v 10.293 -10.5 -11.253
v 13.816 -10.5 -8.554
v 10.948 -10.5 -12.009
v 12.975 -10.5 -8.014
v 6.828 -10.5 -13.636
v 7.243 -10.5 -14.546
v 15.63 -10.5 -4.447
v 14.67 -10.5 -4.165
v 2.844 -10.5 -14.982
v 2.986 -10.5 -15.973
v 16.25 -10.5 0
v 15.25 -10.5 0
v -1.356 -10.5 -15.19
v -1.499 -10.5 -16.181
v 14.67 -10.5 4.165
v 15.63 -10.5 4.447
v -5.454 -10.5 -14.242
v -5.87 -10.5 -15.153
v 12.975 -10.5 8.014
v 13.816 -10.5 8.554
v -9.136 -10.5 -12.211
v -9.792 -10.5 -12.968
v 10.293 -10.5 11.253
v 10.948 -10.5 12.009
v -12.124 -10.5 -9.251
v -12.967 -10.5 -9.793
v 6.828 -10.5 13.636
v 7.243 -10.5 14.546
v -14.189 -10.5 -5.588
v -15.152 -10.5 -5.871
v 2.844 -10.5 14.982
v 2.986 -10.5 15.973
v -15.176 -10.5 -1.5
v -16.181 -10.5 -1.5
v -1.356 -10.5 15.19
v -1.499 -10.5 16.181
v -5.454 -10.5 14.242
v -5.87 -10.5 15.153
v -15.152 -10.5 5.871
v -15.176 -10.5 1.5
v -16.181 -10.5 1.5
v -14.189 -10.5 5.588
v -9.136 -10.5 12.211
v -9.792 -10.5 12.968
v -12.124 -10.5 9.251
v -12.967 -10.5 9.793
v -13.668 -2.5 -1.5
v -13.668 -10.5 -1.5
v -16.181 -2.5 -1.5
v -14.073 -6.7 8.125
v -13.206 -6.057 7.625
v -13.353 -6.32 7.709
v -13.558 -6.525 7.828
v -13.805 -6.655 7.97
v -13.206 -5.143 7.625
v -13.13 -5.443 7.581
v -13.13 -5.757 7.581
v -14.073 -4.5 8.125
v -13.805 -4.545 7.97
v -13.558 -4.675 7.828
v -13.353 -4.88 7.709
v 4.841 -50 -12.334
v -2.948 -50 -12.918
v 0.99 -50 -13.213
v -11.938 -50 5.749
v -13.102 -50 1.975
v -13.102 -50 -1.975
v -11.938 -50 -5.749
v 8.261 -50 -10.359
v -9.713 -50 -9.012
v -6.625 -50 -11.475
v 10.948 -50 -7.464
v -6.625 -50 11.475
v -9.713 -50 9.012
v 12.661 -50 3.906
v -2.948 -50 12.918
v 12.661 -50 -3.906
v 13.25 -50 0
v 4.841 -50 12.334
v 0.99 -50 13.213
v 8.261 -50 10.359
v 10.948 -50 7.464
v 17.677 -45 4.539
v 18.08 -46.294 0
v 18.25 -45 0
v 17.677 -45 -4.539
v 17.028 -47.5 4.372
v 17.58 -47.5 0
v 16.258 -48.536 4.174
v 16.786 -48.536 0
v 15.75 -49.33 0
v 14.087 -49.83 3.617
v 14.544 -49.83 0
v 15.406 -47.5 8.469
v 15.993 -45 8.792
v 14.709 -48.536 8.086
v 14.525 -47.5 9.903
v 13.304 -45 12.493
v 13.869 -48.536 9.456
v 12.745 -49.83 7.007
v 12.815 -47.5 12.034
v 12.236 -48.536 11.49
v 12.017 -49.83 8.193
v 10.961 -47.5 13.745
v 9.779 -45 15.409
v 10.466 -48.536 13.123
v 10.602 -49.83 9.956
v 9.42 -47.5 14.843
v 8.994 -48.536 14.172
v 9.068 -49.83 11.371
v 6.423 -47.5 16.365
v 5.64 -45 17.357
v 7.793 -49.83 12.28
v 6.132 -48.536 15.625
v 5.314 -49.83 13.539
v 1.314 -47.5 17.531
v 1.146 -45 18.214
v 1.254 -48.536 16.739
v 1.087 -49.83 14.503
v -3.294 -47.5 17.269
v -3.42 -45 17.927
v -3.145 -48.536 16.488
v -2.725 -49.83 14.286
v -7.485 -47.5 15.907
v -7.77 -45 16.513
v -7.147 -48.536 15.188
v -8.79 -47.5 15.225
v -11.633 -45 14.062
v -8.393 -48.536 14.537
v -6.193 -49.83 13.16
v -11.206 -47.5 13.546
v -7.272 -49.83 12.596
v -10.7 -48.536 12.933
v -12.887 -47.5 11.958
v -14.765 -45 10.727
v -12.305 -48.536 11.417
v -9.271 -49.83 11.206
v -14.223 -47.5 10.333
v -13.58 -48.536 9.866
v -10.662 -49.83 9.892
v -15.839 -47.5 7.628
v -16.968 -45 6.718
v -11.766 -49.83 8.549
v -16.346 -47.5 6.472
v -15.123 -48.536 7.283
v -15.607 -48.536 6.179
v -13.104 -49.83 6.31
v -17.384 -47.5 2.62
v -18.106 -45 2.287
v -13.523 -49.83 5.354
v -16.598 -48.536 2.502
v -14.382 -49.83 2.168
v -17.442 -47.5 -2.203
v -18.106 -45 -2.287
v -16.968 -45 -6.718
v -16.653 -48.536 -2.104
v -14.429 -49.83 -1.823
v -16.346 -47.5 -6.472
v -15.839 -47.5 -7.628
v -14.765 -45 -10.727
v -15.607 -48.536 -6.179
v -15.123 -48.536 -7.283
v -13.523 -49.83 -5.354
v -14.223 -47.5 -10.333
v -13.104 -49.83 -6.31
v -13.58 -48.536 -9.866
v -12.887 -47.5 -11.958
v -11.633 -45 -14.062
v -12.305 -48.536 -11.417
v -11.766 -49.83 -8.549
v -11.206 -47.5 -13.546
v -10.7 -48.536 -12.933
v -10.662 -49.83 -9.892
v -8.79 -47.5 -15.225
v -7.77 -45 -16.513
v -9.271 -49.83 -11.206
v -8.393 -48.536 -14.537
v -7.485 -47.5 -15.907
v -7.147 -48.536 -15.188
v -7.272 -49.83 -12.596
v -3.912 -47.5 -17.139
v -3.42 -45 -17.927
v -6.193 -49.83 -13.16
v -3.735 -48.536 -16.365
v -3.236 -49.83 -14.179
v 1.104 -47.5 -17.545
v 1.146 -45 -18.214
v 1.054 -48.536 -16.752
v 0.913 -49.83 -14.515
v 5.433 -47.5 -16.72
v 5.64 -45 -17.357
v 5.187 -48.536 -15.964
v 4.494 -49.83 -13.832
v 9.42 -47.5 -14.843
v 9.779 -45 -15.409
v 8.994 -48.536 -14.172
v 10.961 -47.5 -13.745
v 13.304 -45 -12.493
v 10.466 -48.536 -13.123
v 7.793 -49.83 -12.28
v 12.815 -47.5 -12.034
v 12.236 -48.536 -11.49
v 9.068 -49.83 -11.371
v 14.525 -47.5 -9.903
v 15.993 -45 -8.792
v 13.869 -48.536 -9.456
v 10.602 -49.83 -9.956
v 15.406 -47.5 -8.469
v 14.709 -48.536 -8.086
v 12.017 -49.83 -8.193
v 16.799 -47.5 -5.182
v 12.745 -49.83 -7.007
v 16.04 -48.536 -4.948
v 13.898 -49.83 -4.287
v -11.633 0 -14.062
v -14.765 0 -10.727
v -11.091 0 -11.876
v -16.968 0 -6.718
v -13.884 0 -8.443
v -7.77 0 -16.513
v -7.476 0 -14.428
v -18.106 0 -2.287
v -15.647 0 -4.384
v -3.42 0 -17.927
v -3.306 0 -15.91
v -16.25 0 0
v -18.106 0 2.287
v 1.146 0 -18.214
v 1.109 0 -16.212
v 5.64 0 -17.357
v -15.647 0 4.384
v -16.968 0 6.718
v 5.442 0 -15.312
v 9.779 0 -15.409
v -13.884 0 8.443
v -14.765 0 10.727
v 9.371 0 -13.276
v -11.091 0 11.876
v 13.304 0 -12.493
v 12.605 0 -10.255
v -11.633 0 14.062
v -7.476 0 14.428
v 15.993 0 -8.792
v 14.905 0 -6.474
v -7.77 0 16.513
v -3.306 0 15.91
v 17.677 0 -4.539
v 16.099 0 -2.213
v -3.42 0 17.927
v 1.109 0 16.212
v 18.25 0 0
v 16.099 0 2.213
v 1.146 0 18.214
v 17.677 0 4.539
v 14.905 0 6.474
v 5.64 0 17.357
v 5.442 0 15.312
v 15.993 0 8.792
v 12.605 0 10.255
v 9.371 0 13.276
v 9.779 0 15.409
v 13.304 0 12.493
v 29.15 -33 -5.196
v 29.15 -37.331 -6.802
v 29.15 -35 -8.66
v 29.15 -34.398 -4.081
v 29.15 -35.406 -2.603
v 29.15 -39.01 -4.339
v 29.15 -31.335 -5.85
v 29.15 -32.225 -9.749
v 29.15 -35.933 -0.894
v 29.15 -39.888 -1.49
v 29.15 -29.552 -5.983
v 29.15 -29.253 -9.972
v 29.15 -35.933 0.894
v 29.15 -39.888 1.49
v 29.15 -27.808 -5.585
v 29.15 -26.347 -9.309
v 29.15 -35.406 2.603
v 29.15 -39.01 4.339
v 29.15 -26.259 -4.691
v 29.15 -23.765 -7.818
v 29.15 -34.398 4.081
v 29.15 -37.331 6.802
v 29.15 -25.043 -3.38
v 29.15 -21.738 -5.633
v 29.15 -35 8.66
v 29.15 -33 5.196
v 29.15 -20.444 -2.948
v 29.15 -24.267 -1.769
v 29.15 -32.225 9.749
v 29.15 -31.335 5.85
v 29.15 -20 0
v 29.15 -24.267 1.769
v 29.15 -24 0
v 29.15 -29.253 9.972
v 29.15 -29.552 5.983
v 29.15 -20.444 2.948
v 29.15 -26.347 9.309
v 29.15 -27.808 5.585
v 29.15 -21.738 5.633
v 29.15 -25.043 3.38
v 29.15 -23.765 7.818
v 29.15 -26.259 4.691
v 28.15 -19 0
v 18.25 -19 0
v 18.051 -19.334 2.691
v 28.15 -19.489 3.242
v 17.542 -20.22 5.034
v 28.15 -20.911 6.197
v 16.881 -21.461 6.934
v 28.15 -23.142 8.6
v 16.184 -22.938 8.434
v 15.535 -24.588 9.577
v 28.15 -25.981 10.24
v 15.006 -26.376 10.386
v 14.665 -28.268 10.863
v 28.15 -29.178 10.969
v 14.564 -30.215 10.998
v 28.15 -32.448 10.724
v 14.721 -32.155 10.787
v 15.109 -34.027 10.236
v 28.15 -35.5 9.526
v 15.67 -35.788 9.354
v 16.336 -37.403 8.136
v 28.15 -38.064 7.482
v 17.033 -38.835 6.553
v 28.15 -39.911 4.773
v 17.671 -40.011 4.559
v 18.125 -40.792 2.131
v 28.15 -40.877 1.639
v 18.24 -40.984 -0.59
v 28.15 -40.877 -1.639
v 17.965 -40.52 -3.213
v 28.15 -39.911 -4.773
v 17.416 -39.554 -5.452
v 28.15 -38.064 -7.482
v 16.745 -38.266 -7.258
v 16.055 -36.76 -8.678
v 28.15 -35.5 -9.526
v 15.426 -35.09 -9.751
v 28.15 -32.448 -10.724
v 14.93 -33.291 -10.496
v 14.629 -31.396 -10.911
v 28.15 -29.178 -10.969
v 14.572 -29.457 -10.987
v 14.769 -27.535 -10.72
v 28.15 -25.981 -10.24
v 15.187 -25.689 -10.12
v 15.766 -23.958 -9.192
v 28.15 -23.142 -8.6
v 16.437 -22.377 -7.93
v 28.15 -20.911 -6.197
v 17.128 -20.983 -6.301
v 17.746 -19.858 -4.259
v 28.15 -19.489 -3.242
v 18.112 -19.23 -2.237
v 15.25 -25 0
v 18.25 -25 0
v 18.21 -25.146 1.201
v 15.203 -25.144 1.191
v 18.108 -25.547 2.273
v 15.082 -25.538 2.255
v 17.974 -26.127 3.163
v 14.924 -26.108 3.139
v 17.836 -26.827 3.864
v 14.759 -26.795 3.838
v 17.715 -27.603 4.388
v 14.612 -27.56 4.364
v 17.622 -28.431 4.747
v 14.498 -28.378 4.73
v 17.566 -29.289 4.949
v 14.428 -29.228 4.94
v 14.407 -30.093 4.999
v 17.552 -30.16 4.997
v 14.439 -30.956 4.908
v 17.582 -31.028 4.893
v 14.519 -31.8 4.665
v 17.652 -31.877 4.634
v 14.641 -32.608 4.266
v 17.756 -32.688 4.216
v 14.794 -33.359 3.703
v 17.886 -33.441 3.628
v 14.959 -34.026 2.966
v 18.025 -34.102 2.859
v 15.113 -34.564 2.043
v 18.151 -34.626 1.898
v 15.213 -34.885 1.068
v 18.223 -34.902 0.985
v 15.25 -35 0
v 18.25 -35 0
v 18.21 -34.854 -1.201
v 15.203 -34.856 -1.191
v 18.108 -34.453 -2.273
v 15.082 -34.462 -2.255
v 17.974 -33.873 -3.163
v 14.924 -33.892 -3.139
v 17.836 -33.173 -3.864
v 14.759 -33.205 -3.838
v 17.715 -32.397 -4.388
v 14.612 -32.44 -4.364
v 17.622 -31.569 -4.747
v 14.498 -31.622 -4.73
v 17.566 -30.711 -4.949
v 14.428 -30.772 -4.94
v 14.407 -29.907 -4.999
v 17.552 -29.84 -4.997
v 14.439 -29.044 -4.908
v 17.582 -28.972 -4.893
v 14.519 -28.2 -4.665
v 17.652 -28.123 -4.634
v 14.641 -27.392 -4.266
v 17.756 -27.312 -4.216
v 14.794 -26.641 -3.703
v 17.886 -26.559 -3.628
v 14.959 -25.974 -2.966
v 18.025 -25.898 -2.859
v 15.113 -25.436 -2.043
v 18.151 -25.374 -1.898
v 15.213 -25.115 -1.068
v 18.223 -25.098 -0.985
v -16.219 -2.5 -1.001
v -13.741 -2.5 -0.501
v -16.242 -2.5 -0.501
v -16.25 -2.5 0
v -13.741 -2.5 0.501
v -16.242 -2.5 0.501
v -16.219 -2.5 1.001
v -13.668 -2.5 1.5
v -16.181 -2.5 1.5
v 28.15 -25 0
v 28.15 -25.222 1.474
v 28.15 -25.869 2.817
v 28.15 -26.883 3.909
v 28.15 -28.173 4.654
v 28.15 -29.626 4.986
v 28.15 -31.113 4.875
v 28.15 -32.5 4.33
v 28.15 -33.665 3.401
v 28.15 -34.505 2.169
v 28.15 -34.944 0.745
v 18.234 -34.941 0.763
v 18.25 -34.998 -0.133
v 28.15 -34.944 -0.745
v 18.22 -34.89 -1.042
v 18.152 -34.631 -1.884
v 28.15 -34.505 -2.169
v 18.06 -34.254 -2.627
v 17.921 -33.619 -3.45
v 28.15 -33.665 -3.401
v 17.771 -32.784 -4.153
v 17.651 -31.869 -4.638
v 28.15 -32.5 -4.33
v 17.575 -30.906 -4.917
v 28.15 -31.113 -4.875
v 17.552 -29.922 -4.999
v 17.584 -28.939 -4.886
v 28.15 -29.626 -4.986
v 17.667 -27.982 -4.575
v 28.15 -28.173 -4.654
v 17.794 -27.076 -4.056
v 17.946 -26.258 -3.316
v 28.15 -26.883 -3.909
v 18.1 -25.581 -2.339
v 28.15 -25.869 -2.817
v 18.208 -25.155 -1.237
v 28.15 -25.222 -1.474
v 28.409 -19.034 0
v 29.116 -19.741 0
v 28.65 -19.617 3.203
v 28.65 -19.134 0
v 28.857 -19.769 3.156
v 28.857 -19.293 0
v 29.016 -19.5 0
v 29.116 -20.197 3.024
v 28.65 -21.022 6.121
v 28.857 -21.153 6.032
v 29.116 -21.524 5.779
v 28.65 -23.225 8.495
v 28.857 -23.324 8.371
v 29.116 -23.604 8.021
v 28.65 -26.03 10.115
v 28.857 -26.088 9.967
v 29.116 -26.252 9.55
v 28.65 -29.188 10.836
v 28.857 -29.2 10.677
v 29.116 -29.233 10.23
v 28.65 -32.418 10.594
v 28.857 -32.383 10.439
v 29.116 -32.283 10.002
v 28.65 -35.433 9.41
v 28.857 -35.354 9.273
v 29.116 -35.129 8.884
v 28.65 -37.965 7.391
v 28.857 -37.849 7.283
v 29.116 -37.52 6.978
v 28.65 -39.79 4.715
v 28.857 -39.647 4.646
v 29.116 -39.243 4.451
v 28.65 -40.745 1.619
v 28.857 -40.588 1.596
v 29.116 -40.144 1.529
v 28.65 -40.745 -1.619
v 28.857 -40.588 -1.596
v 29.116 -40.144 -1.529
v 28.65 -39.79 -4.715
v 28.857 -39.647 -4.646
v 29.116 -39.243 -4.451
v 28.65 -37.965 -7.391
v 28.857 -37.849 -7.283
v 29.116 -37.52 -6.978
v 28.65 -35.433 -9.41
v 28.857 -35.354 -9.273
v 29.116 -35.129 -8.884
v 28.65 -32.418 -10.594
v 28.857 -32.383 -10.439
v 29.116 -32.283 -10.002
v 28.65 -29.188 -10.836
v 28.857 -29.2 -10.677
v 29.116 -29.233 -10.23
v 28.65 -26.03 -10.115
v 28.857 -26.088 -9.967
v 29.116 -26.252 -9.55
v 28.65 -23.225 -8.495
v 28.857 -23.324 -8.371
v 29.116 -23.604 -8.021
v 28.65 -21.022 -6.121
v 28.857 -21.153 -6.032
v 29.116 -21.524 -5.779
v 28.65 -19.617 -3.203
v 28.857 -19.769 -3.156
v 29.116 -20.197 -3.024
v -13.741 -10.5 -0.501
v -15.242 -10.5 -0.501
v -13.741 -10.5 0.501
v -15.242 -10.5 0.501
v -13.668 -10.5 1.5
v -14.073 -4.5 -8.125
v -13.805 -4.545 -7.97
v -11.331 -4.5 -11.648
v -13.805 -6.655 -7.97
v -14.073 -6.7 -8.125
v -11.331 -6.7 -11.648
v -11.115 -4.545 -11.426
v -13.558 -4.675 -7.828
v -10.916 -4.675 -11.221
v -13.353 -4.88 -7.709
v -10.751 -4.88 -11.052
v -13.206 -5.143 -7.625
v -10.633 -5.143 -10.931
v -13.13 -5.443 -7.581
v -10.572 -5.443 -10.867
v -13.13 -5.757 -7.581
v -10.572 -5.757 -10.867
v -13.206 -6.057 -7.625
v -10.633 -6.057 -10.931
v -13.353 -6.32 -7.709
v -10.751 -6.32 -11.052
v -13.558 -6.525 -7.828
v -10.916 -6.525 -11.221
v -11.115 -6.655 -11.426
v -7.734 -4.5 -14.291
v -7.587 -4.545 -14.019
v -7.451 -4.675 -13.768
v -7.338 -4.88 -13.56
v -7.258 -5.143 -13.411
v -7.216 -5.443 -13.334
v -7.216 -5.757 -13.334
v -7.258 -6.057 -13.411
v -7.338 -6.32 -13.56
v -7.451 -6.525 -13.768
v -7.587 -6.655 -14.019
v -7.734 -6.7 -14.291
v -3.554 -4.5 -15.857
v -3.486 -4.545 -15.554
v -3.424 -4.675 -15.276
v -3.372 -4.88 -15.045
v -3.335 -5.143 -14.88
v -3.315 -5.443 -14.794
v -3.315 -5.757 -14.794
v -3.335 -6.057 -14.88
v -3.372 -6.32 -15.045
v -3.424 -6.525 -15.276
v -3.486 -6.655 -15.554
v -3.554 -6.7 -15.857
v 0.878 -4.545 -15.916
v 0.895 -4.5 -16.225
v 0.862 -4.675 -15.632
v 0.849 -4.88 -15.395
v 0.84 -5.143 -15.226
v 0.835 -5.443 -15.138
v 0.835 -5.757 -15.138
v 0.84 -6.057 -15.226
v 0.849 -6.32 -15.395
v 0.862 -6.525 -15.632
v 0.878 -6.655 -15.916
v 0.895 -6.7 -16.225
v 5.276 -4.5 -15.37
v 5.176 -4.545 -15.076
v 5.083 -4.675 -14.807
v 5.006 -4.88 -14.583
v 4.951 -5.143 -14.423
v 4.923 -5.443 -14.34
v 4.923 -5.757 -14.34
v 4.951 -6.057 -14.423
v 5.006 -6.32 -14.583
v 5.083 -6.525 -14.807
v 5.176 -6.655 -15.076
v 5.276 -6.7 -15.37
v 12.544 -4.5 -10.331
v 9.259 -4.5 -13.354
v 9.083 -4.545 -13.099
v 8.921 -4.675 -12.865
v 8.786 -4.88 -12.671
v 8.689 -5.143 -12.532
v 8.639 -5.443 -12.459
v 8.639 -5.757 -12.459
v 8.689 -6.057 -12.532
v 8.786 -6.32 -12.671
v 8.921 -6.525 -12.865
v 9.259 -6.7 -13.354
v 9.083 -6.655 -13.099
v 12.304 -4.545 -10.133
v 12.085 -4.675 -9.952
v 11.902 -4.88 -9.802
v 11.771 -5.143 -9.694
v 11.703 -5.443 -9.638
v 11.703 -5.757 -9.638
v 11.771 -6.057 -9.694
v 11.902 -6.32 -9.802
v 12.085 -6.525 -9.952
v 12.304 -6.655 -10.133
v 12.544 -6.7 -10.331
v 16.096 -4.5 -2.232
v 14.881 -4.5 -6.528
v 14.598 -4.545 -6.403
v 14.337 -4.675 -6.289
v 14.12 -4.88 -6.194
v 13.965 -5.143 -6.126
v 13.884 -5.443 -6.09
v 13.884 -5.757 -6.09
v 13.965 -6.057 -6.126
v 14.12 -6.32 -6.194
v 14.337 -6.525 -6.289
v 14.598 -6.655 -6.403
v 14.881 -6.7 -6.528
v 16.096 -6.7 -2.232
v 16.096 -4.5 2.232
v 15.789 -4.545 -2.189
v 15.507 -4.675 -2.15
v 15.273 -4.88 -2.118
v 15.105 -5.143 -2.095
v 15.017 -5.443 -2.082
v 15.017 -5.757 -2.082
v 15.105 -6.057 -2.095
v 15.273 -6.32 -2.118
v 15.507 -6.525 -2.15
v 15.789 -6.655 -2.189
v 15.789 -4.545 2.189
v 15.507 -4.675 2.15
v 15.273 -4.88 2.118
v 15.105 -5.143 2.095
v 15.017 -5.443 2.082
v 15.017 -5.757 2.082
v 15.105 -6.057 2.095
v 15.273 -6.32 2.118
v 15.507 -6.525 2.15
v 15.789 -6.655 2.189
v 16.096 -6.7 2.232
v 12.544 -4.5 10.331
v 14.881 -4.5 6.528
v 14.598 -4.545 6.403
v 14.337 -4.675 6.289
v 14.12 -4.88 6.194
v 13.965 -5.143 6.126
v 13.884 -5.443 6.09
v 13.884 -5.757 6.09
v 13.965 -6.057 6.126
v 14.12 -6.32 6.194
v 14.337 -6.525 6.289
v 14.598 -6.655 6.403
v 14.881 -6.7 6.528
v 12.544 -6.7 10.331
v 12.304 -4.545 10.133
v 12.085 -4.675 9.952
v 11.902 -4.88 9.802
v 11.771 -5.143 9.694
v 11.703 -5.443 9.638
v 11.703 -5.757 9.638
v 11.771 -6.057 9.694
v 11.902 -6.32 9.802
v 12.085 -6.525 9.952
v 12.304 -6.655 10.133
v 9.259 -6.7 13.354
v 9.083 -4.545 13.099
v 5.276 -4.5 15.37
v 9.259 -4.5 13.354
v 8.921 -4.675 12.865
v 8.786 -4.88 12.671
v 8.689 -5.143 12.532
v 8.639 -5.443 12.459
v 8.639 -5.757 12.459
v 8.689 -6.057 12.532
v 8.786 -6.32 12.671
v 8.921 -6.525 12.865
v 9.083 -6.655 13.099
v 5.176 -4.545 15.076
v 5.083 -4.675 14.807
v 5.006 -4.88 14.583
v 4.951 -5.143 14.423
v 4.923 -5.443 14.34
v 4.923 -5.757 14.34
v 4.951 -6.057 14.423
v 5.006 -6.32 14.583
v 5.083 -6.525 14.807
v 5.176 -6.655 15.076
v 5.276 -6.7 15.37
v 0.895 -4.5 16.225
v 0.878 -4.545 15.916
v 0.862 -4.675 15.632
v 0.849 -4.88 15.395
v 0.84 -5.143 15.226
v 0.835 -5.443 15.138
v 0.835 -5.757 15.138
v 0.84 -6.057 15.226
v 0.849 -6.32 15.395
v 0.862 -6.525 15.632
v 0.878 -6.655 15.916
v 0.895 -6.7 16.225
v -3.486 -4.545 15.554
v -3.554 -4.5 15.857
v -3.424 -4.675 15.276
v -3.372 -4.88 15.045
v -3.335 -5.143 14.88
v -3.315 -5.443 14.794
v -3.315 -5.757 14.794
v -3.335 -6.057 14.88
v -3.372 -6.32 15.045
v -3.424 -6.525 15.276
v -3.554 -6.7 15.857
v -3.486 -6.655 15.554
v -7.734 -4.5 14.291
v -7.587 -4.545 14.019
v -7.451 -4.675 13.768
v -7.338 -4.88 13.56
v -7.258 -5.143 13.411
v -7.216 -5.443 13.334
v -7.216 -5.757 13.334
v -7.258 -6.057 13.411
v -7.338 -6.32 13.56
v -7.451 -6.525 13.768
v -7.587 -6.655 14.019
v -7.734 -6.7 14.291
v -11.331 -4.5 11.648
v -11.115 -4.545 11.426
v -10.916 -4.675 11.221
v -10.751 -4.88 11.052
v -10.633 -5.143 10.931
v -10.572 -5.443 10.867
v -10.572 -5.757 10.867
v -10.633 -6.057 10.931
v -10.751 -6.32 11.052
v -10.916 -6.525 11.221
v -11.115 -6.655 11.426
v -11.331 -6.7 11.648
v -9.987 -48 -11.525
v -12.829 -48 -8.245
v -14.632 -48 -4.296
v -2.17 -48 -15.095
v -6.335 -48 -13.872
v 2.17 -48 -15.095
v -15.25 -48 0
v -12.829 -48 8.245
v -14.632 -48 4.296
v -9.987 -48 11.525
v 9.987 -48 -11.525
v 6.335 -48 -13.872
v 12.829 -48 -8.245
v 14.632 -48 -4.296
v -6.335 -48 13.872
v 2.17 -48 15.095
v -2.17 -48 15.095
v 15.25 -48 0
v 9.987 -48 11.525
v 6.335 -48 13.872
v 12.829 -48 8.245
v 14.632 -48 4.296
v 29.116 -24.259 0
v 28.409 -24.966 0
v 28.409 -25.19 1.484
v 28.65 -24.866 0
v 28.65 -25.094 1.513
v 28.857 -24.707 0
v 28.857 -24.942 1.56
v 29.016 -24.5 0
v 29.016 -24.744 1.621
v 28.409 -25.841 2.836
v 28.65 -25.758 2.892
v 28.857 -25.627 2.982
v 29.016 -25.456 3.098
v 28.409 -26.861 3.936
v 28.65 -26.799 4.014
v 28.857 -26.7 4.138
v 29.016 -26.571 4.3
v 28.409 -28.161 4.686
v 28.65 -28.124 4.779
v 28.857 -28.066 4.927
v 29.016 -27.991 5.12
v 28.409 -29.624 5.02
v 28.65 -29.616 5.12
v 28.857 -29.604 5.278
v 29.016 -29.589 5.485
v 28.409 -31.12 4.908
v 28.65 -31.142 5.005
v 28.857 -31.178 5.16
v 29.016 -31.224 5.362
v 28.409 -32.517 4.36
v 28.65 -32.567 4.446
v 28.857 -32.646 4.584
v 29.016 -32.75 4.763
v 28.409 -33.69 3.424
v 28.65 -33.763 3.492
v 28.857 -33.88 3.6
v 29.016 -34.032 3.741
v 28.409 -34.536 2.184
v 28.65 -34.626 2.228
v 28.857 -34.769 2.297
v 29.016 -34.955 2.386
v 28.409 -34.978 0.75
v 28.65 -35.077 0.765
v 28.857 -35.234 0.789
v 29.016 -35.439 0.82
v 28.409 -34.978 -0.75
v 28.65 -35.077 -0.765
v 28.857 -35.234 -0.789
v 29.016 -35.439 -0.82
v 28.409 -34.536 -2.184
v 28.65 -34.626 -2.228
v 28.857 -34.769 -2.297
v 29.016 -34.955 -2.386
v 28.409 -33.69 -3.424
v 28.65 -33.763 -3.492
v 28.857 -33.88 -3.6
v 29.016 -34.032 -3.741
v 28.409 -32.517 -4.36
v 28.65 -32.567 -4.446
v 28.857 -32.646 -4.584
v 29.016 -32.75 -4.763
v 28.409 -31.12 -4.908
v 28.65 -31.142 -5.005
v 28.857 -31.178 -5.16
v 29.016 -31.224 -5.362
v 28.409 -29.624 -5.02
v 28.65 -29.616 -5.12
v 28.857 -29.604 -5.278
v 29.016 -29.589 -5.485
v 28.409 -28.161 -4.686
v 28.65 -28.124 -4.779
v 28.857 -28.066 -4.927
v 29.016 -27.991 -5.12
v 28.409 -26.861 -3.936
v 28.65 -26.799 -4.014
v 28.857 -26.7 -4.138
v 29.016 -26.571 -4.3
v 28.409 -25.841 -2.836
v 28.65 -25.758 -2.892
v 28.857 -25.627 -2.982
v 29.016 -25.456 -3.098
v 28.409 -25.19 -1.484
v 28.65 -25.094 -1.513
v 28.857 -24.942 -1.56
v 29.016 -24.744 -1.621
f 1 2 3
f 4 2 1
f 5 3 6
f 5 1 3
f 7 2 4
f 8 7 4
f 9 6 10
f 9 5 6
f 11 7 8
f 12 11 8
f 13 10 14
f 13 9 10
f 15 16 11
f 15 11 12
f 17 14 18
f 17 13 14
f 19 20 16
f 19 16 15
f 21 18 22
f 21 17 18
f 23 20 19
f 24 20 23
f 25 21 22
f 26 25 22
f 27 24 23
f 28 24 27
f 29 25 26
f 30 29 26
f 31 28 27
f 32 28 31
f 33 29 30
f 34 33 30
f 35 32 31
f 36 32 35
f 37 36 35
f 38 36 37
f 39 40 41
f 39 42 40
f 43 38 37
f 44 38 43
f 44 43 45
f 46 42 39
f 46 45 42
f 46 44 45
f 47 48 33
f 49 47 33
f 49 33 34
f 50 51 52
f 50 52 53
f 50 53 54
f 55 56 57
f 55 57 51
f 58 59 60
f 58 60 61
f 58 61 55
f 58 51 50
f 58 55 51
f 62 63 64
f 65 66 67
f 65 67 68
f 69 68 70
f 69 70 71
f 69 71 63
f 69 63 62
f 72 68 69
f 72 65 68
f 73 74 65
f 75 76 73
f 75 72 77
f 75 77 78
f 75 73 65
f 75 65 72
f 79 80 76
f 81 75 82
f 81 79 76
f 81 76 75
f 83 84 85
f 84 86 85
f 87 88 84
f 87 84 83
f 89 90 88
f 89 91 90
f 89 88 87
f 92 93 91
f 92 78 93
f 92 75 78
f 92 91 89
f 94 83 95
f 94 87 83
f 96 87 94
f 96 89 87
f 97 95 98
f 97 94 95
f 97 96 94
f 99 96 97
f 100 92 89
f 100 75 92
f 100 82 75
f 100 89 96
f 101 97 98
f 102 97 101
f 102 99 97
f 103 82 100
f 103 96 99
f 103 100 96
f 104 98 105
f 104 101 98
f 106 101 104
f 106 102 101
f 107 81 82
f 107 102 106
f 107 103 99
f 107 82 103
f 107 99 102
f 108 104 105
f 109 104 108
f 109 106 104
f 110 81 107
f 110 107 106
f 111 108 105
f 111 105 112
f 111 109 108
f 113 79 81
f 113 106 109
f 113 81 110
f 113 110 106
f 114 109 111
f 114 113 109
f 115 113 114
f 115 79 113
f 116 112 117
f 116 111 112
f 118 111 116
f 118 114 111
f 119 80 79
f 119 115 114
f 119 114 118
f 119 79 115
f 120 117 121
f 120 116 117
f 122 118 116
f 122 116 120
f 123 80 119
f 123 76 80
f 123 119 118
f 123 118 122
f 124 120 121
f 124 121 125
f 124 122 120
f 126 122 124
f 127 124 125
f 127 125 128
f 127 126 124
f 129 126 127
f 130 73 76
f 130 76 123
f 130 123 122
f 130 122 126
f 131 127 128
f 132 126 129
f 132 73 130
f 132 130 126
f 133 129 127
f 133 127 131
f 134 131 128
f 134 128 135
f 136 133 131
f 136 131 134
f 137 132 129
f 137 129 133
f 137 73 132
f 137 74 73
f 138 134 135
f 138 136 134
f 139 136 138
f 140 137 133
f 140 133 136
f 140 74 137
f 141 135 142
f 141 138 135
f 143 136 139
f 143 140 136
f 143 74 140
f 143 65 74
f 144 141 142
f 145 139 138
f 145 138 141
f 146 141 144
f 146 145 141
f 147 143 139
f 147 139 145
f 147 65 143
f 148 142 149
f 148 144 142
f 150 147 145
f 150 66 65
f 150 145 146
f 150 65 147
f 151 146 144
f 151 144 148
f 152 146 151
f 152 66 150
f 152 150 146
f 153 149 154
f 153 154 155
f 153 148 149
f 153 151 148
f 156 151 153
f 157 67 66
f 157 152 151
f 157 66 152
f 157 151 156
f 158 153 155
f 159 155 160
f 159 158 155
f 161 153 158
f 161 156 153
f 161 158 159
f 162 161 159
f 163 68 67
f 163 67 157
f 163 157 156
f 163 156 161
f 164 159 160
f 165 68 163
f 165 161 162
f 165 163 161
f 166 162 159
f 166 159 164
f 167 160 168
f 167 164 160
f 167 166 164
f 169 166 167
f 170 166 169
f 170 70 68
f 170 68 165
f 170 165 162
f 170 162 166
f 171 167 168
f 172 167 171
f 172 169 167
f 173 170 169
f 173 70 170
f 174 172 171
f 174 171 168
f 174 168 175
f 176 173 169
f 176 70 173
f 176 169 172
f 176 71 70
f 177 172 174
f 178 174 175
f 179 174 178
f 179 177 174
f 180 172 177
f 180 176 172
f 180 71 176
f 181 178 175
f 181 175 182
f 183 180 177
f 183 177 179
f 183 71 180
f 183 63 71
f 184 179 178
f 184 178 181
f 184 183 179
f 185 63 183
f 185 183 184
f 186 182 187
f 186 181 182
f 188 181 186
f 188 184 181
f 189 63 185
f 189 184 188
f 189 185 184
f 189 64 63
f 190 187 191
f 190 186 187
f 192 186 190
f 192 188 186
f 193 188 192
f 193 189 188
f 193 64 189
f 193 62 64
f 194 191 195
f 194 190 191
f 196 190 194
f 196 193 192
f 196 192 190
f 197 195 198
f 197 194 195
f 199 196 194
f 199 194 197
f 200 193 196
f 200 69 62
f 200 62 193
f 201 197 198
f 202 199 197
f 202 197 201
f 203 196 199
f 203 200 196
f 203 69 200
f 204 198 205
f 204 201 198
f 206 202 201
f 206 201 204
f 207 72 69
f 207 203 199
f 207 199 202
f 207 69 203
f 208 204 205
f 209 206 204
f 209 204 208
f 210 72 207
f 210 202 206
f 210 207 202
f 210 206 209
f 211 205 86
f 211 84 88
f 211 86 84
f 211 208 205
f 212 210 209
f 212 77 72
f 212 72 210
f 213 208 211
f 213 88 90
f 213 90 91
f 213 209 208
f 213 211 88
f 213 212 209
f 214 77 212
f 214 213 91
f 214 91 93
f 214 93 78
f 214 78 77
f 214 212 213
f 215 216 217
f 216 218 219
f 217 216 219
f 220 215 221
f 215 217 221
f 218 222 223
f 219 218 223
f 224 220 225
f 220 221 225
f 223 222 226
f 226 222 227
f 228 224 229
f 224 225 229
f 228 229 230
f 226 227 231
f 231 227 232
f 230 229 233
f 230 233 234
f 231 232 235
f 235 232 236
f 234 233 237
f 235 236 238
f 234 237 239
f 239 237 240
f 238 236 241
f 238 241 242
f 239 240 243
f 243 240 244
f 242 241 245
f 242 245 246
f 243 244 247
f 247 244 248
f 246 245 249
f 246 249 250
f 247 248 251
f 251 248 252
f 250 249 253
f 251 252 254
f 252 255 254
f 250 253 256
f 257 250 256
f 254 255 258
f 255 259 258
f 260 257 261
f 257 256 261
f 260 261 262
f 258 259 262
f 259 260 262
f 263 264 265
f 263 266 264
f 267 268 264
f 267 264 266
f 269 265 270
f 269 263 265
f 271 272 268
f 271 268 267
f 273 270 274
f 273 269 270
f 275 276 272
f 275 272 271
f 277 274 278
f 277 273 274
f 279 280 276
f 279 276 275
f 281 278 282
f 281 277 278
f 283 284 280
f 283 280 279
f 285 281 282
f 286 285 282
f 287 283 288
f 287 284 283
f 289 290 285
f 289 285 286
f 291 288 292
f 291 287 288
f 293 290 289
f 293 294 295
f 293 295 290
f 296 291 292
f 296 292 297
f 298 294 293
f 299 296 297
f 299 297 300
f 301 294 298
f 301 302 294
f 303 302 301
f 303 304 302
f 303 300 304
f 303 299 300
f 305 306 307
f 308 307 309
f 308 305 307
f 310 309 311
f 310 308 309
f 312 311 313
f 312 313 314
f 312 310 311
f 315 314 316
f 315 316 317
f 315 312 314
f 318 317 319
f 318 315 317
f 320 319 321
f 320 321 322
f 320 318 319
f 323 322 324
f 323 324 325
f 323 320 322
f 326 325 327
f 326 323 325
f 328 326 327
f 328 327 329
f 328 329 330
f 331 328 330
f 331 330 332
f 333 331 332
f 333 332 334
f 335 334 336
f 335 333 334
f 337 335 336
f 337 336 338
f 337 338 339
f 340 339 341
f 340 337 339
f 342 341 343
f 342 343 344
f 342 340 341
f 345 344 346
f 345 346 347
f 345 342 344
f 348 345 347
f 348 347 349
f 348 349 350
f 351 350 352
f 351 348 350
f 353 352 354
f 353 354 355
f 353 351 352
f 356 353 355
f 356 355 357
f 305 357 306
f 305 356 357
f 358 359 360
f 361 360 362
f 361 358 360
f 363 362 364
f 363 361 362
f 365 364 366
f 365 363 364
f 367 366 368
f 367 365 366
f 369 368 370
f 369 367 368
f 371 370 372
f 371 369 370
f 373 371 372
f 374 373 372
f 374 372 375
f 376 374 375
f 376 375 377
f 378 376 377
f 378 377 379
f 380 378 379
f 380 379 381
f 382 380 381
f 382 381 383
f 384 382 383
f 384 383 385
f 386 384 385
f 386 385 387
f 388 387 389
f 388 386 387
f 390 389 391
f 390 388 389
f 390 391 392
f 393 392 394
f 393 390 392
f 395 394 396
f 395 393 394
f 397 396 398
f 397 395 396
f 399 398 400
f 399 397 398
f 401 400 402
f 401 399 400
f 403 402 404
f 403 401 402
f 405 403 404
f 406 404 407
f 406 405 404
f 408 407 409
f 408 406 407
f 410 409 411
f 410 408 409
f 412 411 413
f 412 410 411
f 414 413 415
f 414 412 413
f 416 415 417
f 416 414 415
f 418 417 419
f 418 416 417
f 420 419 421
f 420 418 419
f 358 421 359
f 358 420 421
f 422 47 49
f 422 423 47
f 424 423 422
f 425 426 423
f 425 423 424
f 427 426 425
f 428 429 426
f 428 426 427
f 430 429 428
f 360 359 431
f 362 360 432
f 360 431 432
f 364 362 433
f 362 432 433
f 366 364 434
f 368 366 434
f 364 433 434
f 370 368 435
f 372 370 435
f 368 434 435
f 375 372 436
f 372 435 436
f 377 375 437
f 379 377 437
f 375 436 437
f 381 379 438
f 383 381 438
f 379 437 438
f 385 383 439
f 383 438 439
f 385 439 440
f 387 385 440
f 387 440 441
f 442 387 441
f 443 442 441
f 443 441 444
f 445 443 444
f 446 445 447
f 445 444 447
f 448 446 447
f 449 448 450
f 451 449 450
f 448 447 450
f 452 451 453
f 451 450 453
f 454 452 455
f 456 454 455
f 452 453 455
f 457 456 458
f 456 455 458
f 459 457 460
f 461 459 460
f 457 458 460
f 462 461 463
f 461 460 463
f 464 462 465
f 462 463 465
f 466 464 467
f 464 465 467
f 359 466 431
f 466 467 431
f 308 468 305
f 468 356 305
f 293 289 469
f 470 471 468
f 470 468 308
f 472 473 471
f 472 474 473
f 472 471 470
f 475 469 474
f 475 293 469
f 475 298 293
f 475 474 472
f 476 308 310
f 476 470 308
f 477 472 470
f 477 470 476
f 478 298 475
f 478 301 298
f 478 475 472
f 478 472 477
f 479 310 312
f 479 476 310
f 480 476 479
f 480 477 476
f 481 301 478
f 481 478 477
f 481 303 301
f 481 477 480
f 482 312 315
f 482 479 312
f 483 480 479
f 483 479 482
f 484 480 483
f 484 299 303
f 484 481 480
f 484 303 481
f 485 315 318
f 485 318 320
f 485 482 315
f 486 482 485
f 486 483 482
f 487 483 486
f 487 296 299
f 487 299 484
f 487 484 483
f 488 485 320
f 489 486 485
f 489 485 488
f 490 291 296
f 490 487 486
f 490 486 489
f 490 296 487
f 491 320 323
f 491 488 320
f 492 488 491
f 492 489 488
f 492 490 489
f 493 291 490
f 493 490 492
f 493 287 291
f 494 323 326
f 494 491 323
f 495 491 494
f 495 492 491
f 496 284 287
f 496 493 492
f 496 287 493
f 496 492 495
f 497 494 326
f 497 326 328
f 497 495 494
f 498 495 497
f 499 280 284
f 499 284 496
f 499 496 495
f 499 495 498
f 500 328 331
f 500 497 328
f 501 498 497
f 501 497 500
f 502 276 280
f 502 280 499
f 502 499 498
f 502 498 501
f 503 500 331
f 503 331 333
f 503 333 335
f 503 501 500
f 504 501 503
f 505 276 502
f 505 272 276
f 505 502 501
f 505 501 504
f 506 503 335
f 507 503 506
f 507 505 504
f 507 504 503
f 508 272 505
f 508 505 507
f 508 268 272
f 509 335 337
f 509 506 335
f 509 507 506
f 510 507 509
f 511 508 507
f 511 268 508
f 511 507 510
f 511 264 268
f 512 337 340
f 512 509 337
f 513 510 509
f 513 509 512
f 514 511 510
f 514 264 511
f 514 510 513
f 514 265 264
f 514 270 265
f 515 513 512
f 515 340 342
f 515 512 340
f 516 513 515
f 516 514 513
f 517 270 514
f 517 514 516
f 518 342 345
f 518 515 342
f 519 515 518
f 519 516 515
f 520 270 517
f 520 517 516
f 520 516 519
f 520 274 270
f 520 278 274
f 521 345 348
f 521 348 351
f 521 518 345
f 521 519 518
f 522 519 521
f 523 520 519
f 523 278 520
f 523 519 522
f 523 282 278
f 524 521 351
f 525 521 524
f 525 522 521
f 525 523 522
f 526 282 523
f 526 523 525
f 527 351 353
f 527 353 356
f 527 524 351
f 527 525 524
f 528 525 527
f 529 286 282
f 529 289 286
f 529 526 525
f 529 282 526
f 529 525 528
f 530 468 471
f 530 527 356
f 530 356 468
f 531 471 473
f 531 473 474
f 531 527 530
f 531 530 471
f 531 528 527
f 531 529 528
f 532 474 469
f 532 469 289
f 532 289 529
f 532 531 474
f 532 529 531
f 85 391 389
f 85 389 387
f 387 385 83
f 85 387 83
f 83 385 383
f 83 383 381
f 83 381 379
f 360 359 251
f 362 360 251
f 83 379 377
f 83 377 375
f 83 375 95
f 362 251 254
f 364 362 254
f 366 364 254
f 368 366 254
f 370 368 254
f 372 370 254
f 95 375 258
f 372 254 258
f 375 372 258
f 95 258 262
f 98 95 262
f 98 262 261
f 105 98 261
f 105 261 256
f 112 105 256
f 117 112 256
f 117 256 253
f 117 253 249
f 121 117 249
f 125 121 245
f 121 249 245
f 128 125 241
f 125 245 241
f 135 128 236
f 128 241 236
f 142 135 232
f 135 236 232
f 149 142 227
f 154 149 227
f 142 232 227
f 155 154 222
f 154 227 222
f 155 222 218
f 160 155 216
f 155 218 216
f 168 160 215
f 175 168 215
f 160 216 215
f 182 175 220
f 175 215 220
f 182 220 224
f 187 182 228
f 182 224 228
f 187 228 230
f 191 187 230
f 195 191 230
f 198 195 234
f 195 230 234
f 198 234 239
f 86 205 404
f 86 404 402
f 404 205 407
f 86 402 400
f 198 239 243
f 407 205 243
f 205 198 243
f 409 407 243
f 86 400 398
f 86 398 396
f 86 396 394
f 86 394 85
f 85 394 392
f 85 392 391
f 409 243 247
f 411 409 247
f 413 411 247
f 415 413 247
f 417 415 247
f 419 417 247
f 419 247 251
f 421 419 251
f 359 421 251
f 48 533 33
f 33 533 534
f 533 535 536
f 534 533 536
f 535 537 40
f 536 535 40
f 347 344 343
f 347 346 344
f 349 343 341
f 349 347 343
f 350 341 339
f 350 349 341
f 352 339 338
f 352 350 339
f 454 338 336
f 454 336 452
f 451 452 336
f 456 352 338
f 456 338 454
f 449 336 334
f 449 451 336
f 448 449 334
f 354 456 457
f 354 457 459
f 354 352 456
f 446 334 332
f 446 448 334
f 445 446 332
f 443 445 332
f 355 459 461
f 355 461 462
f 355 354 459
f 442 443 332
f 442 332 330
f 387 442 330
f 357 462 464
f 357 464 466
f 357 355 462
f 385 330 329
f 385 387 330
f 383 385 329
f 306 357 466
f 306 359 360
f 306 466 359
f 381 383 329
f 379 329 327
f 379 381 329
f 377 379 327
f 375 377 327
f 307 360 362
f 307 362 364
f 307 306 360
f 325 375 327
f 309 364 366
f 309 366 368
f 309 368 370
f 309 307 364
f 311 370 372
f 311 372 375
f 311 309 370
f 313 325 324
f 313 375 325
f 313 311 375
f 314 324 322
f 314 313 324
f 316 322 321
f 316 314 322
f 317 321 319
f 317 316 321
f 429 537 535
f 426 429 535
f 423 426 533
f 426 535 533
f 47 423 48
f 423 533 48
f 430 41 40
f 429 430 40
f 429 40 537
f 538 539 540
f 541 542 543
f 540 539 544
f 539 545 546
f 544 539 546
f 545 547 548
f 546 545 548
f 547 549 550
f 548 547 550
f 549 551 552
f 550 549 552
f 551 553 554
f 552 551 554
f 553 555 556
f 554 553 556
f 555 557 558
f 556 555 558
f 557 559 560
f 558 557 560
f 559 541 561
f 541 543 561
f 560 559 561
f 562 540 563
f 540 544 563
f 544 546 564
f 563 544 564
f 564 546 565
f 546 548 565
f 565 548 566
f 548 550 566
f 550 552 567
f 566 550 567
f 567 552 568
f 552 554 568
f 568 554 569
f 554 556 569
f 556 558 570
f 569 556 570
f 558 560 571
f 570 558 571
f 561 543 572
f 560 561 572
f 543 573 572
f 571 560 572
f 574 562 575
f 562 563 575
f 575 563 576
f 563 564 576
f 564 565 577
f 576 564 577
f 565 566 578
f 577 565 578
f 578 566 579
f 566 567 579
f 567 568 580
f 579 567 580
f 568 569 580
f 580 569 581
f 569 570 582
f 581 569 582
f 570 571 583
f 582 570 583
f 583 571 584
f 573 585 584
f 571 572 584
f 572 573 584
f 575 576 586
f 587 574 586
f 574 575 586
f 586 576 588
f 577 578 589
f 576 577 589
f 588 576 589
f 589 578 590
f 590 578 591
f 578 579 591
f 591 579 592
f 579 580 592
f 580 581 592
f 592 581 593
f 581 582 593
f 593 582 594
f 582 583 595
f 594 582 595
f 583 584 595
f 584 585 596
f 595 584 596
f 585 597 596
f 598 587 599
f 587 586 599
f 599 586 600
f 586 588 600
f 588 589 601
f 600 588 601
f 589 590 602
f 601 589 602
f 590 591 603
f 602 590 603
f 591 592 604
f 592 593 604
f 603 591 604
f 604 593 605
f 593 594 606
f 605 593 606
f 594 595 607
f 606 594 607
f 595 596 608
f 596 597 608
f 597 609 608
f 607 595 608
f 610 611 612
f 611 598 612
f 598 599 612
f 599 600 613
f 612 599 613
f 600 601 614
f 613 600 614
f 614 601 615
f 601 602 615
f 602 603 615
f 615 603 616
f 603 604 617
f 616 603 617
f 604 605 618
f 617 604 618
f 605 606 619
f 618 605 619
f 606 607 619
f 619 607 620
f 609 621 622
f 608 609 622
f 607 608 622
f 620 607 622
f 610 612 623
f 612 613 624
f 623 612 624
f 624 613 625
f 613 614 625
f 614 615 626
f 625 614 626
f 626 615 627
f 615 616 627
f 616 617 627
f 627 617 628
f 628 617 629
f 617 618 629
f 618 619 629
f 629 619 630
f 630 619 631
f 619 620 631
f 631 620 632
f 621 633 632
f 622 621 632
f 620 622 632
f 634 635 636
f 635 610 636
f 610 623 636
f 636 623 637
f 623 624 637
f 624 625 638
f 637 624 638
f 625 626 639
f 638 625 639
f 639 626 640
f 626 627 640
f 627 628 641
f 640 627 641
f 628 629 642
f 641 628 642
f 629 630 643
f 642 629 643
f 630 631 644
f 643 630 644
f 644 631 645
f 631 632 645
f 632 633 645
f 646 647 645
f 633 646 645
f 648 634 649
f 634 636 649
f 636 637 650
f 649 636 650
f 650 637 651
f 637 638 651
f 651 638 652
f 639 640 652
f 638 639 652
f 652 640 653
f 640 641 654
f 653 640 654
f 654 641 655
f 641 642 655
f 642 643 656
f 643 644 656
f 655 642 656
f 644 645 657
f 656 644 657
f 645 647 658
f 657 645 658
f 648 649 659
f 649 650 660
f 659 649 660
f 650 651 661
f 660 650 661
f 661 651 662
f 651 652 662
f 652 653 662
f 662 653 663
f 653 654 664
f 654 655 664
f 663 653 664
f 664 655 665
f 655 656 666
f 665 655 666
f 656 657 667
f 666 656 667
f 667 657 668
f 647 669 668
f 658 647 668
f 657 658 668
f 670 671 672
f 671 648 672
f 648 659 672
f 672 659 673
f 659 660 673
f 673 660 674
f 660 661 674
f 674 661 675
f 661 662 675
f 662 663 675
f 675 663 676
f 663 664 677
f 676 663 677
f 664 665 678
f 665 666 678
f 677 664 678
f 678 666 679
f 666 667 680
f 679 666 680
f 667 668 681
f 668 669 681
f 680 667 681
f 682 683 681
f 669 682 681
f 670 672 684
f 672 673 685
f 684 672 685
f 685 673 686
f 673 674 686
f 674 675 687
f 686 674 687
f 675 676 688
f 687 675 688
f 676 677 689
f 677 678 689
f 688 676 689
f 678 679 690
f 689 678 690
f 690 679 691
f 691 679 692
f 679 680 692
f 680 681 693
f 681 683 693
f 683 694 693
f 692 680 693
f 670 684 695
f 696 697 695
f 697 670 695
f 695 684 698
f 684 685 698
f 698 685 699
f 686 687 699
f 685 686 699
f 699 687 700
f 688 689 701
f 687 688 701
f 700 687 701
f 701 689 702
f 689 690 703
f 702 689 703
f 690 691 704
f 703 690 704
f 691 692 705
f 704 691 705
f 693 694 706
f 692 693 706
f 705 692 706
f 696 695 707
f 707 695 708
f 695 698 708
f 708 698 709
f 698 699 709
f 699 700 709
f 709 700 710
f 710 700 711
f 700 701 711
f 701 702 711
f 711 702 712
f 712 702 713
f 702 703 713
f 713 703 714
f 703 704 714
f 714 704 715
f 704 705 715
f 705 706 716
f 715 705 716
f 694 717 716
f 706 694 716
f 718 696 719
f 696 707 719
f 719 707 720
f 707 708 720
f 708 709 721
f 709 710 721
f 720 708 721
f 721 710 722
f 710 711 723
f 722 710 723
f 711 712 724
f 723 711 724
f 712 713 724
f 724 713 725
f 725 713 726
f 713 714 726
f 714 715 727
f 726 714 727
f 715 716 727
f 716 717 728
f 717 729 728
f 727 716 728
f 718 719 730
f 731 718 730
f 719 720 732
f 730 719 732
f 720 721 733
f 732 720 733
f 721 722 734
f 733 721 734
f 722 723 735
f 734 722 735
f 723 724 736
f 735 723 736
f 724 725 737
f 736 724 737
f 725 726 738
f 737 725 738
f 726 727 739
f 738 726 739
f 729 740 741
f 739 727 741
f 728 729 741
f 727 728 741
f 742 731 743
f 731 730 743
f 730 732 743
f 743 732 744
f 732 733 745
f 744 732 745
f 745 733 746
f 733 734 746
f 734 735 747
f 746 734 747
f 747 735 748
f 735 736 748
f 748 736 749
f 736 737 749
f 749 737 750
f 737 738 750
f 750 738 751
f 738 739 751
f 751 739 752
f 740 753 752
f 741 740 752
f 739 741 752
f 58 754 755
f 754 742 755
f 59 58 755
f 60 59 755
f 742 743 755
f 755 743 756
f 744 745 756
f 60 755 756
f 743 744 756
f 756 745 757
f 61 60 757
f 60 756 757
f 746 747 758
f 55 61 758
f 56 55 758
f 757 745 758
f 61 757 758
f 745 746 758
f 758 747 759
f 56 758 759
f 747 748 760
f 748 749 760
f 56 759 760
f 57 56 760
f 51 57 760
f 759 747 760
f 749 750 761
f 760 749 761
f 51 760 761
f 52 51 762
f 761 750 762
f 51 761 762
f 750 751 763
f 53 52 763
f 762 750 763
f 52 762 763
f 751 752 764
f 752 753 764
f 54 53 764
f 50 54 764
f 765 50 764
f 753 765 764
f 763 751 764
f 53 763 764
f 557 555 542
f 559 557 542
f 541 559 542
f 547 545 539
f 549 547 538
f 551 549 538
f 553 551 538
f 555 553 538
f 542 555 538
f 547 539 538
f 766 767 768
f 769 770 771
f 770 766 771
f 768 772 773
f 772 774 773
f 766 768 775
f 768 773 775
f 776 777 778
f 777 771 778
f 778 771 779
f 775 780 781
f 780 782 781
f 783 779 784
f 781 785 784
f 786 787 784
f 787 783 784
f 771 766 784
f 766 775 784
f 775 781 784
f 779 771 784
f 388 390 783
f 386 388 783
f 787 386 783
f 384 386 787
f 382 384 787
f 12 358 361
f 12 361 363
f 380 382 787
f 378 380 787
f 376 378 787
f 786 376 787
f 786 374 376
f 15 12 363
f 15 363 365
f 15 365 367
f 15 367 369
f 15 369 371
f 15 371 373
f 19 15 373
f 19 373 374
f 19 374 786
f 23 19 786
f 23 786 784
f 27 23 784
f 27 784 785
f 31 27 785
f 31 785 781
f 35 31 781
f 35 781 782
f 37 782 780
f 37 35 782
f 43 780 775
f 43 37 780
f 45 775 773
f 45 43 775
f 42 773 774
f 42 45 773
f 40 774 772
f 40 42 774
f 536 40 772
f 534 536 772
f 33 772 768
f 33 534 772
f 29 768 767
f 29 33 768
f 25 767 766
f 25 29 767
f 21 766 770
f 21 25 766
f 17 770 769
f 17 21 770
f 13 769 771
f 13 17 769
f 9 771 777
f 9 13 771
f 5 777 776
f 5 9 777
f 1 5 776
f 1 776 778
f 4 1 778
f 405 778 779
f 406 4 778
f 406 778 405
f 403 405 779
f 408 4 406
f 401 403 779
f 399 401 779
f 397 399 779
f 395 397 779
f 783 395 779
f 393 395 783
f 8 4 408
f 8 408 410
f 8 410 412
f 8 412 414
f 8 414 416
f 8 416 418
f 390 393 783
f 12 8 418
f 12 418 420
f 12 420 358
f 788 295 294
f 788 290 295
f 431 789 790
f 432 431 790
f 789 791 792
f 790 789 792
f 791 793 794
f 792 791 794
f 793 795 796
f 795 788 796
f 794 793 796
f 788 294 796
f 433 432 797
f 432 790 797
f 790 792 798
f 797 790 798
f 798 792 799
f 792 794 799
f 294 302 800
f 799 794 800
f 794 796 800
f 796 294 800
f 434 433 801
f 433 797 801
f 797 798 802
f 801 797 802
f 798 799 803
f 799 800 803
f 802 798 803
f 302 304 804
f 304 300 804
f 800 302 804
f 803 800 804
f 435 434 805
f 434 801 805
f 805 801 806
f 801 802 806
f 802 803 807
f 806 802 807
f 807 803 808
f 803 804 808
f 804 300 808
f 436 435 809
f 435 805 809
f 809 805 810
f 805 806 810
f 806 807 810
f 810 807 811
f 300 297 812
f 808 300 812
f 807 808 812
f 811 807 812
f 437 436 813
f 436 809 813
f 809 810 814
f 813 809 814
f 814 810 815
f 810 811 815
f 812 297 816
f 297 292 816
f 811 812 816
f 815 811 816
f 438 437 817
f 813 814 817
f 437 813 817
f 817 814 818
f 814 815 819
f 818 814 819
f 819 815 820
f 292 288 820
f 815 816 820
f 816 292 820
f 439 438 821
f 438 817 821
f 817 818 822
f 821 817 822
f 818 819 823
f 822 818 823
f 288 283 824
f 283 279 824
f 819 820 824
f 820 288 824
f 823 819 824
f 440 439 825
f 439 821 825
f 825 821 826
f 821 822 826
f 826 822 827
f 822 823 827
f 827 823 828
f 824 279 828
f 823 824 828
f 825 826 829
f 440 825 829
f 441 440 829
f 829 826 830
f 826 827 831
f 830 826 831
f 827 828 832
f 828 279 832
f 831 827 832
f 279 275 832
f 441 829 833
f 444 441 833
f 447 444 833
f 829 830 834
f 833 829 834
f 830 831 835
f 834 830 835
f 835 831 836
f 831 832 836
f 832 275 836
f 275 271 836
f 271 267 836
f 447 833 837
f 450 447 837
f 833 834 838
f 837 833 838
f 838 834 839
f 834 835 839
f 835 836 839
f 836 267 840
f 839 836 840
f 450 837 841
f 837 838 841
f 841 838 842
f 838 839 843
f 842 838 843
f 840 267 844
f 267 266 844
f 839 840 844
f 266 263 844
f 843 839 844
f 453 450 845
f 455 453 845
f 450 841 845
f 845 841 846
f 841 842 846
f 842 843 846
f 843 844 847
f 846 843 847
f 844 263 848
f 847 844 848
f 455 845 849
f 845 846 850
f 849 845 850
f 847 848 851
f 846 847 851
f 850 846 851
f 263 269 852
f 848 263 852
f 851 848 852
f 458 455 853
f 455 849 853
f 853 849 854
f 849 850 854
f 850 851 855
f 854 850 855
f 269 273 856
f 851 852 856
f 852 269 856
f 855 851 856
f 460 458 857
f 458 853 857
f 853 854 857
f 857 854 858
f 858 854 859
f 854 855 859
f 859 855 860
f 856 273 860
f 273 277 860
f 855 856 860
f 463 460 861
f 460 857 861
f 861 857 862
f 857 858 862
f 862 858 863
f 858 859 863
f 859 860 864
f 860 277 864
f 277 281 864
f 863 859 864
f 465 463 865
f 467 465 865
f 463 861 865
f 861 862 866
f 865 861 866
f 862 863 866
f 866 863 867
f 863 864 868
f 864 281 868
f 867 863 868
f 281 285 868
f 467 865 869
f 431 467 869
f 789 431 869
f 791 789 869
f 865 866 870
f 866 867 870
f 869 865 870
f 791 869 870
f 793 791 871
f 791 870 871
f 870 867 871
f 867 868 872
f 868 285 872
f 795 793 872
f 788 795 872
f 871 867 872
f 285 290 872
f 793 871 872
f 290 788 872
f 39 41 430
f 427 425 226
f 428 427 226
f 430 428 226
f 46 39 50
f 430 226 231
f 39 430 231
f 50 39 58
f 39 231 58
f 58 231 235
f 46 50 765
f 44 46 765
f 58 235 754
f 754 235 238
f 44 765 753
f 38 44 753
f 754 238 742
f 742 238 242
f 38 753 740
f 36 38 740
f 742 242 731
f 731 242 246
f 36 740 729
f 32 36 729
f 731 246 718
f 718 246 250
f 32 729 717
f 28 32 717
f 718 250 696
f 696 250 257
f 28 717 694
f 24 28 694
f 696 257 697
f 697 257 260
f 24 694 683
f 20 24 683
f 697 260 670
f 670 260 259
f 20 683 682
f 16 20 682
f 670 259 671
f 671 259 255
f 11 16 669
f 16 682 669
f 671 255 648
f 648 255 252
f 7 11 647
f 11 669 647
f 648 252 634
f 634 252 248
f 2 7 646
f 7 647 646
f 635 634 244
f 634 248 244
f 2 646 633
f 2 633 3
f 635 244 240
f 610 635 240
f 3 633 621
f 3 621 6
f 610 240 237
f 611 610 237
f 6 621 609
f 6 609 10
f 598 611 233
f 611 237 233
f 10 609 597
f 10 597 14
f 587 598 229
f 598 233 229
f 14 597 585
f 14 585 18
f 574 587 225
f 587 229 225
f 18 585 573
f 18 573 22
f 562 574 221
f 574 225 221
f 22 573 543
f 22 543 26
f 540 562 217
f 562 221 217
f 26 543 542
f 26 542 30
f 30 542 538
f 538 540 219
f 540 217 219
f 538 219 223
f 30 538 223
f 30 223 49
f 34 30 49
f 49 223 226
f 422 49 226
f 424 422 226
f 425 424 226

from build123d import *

# Parameters (mm, degrees)
F0_R           = 18.25
F0_R_2         = 15.25
F1_DEPTH       = 50
F2_R           = 18.25
F3_DEPTH       = 2
F4_R           = 5
F5_R           = 16.25
F6_DEPTH       = 10.5
F7_R           = 5
F8_DEPTH       = 18.251
F10_R          = 11
F10_R_2        = 5
F11_REACH      = 78.5136984722
F12_R          = 1
F14_DEPTH      = 8
F15_R          = 1.1
F16_ANGLE_BACK = 150
F16_ANGLE      = 300


with BuildPart() as f1:
    # F0 (on Front) → F1 (new body)
    with BuildSketch(Plane.XZ):
        Circle(F0_R)
        Circle(F0_R_2, mode=Mode.SUBTRACT)
    extrude(amount=F1_DEPTH)

    # F2 (on face) → F3 (join)
    with BuildSketch(Plane.XZ.offset(50)):
        Circle(F2_R)
    extrude(amount=-F3_DEPTH)

    # F4
    f4_edges = [f1.edges().sort_by_distance(p)[0] for p in [
        (-18.25, -50, 0),
    ]]
    fillet(f4_edges, radius=F4_R)

    # F5 (on face) → F6 (cut)
    with BuildSketch(Plane(origin=(0, 0, 0), x_dir=(-1, 0, 0), z_dir=(0, 1, 0))):
        Circle(F5_R)
    extrude(amount=-F6_DEPTH, mode=Mode.SUBTRACT)

    # F7 (on Right) → F8 (cut, through all)
    with BuildSketch(Plane.YZ):
        with Locations((-30, 0)):
            Circle(F7_R)
    extrude(amount=F8_DEPTH, mode=Mode.SUBTRACT)


with BuildPart() as f11:
    f11_end = f1.part.faces().sort_by_distance((-18.25, -22.5, 0))[0]
    # F10 (on offset) → F11 (new body, up to a face of F1 that its end follows)
    with BuildSketch(Plane.YZ.offset(29.15)):
        with Locations((-30, 0)):
            Circle(F10_R)
        with Locations((-30, 0)):
            Circle(F10_R_2, mode=Mode.SUBTRACT)
    f11_long = extrude(amount=-F11_REACH, mode=Mode.PRIVATE)
    add(split(f11_long, bisect_by=f11_end, keep=Keep.ALL, mode=Mode.PRIVATE).solids().sort_by_distance((29.15, -40.6888730163, 0))[0])

    # F12
    f12_edges = [f11.edges().sort_by_distance(p)[0] for p in [
        (29.15, -35, 0),
        (29.15, -41, 0),
    ]]
    fillet(f12_edges, radius=F12_R)


with BuildPart() as f1_1:
    add(f1.part)

    # F13 (on face) → F14 (join)
    with BuildSketch(Plane(origin=(0, -10.5, 0), x_dir=(-1, 0, 0), z_dir=(0, 1, 0))):
        with BuildLine():
            Line((13.6679369328, -1.5), (16.1806211253, -1.5))
            ThreePointArc((16.1806211253, -1.5), (16.25, 0), (16.1806211253, 1.5))
            Line((16.1806211253, 1.5), (13.6679369328, 1.5))
            ThreePointArc((13.6679369328, 1.5), (13.75, 0), (13.6679369328, -1.5))
        make_face()
    extrude(amount=F14_DEPTH)

    # F15 (on Top) → F16 (revolve)
    with BuildSketch(Plane.XY, mode=Mode.PRIVATE) as f16_sk:
        with Locations((16.25, -5.6)):
            Circle(F15_R)
    revolve(f16_sk.sketch.rotate(Axis((0, -13.1502728909, 0), (0, -1, 0)), -F16_ANGLE_BACK), axis=Axis((0, -13.1502728909, 0), (0, -1, 0)), revolution_arc=F16_ANGLE)


solid = Compound([f11.part, f1_1.part])
